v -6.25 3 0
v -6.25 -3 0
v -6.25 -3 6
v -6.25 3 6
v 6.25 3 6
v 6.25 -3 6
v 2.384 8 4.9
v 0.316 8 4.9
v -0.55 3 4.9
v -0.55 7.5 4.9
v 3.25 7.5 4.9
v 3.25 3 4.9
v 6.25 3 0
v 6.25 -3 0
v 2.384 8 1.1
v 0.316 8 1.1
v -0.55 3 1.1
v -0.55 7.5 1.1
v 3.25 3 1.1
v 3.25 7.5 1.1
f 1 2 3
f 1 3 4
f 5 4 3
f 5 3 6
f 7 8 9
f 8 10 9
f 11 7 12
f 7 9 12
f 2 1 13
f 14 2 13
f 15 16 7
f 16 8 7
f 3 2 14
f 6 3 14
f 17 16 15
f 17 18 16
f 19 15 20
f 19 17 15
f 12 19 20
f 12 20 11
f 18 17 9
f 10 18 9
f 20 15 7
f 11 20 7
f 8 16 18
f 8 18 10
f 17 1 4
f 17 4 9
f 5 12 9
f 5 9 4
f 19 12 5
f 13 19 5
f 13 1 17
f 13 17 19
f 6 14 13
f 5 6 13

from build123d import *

# Parameters (mm, degrees)
SKETCH_W        = 12.5
SKETCH_H        = 6
PAD001_DEPTH    = 6
SKETCH006_W     = 3.8
SKETCH006_H     = 3.8
PAD002_DEPTH    = 8
CHAMFER_1_ANGLE = 60
CHAMFER_1_SIZE  = 0.5
CHAMFER_2_ANGLE = 60
CHAMFER_2_SIZE  = 0.5


with BuildPart() as part:
    # Sketch → Pad001 (new body)
    with BuildSketch(Plane.XY):
        Rectangle(SKETCH_W, SKETCH_H)
    extrude(amount=PAD001_DEPTH)

    # Sketch006 → Pad002 (join)
    with BuildSketch(Plane.XZ):
        with Locations((1.35, 3)):
            Rectangle(SKETCH006_W, SKETCH006_H)
    extrude(amount=-PAD002_DEPTH)

    # Chamfer 1
    chamfer_1_edges = [part.edges().sort_by_distance(p)[0] for p in [
        (3.25, 8, 3),
    ]]
    chamfer_1_side = part.faces().sort_by_distance((3.25, 5.5, 3))[0]
    chamfer(chamfer_1_edges, length=CHAMFER_1_SIZE, angle=CHAMFER_1_ANGLE, reference=chamfer_1_side)

    # Chamfer 2
    chamfer_2_edges = [part.edges().sort_by_distance(p)[0] for p in [
        (-0.55, 8, 3),
    ]]
    chamfer_2_side = part.faces().sort_by_distance((-0.55, 5.5, 3))[0]
    chamfer(chamfer_2_edges, length=CHAMFER_2_SIZE, angle=CHAMFER_2_ANGLE, reference=chamfer_2_side)


solid = part.part
